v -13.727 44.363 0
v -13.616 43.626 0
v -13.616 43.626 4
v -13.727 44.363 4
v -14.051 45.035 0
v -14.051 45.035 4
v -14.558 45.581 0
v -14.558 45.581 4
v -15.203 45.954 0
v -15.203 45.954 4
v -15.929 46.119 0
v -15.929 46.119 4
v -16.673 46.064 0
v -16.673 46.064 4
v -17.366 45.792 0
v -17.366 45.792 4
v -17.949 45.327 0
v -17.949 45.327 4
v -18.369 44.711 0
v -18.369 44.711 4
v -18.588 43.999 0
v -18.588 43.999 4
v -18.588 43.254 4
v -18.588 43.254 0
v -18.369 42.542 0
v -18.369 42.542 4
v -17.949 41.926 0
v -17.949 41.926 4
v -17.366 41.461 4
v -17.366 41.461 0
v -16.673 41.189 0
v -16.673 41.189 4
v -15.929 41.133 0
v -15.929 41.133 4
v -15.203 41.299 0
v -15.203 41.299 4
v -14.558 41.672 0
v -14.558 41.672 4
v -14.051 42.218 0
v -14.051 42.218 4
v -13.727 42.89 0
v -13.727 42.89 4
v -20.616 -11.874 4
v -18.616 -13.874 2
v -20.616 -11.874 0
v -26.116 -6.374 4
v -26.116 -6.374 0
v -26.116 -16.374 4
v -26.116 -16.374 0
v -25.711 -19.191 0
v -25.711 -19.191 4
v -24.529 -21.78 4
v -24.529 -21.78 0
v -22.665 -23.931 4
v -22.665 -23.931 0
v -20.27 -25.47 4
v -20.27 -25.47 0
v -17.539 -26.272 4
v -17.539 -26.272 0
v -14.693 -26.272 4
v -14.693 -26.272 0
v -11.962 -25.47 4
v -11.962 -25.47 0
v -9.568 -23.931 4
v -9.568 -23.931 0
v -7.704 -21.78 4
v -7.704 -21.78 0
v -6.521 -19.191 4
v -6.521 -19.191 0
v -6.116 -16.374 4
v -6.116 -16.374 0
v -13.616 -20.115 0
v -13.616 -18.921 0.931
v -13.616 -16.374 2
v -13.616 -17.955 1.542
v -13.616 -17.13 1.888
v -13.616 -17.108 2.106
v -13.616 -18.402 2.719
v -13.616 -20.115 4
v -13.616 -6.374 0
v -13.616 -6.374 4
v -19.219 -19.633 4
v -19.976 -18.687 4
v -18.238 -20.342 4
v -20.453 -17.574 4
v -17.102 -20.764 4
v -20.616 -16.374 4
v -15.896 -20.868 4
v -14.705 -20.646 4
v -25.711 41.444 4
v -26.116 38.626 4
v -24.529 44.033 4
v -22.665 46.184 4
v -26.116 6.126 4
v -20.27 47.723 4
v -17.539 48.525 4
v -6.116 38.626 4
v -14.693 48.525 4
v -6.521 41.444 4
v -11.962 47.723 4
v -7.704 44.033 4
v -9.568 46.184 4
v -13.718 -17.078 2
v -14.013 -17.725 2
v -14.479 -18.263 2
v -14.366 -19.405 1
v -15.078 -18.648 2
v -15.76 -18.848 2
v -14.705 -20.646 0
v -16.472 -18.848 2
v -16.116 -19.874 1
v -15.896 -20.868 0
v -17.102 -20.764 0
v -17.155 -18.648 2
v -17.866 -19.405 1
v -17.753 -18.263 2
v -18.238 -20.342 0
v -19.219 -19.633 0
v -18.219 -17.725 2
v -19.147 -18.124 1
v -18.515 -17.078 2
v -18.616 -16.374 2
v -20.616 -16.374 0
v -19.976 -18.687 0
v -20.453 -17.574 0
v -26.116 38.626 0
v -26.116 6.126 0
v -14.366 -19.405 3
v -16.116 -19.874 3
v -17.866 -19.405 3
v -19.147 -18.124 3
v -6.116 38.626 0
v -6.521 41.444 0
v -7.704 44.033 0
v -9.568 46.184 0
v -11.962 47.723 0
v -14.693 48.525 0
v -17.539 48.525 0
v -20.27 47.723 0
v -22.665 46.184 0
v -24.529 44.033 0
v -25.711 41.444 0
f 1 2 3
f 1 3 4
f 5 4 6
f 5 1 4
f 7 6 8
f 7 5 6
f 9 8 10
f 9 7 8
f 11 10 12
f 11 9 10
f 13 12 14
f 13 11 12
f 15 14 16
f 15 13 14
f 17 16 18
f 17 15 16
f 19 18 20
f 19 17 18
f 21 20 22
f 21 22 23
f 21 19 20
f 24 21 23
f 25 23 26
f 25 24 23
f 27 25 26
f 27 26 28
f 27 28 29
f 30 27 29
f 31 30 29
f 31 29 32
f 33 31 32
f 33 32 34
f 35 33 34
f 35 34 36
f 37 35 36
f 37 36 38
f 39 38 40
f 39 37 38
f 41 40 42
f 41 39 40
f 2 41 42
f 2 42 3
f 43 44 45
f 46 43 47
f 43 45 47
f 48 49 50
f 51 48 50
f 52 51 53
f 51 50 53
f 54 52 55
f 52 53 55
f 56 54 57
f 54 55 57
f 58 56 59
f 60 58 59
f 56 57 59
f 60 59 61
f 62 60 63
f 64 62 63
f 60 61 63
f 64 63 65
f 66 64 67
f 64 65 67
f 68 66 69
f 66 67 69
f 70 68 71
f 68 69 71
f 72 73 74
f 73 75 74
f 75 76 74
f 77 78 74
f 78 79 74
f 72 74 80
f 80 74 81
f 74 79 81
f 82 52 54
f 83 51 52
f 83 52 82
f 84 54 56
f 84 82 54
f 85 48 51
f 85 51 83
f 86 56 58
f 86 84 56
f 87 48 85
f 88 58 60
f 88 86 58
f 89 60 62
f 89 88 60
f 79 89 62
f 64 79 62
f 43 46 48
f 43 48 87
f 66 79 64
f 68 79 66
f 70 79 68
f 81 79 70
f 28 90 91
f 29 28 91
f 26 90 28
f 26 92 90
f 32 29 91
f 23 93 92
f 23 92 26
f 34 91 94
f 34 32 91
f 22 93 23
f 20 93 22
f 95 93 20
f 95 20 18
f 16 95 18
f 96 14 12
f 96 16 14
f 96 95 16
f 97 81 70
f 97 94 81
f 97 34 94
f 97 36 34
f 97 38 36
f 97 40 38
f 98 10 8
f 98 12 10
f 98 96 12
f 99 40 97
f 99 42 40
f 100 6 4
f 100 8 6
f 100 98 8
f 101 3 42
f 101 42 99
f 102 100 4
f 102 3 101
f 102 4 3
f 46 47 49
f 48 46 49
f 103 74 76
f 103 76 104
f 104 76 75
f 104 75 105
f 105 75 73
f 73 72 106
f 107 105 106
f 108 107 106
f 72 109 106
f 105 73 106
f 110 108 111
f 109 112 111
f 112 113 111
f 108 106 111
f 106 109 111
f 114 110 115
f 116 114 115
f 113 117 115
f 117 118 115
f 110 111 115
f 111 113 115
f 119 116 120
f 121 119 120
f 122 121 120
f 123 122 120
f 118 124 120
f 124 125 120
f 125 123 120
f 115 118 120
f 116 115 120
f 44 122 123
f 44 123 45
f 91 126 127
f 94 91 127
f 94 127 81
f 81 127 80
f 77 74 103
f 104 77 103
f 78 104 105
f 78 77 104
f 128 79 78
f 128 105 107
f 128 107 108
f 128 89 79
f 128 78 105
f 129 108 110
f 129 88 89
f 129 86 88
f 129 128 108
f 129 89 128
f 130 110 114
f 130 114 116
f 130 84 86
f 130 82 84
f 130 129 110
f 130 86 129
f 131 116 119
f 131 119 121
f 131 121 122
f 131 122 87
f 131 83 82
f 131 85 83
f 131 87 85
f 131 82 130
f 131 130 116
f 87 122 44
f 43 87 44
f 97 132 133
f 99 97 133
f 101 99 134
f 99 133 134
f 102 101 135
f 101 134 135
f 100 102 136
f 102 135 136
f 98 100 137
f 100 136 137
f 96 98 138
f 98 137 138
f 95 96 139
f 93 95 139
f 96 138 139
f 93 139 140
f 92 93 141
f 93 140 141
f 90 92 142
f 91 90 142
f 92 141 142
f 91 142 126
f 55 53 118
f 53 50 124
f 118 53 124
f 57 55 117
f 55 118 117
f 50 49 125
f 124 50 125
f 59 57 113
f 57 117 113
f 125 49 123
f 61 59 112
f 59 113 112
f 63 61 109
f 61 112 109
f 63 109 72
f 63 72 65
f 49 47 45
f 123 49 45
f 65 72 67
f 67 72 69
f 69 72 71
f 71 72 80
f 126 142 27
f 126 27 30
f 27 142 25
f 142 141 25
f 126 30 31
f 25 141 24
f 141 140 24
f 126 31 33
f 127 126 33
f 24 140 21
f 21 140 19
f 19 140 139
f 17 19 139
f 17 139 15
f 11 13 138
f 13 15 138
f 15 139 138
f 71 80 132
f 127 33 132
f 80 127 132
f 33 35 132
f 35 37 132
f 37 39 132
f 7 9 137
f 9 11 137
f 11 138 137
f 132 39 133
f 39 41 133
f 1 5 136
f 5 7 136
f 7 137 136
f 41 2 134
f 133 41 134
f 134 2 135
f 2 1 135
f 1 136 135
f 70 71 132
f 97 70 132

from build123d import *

# Parameters (mm, degrees)
F0_R     = 2.5
F1_DEPTH = 4
F2_SIZE  = 1.99999
F3_W     = 3.2302876376
F3_H     = 15.0867640845
F4_DEPTH = 4


# Not quite as in the source:
# - a fillet or chamfer is up to 0.001 mm smaller than in the source, because OpenCascade refuses the exact size


with BuildPart() as f1:
    # F0 (on Top) → F1 (new body)
    with BuildSketch(Plane.XY):
        with BuildLine():
            ThreePointArc((-6.116279643, 38.6264544598), (-16.116279643, 28.6264544598), (-26.116279643, 38.6264544598))
            Line((-26.116279643, 38.6264544598), (-26.116279643, 6.1264544598))
            Line((-26.116279643, 6.1264544598), (-16.116279643, -3.8735455402))
            Line((-16.116279643, -3.8735455402), (-13.616279643, -6.3735455402))
            Line((-13.616279643, -6.3735455402), (-13.616279643, -12.0434185212))
            Line((-13.616279643, -12.0434185212), (-13.616279643, -16.3735455402))
            Line((-13.616279643, -16.3735455402), (-13.616279643, -20.7036725591))
            ThreePointArc((-13.616279643, -20.7036725591), (-18.616279643, -20.7036725591), (-21.116279643, -16.3735455402))
            Line((-21.116279643, -16.3735455402), (-21.116279643, -11.3735455402))
            Line((-21.116279643, -11.3735455402), (-26.116279643, -6.3735455402))
            Line((-26.116279643, -6.3735455402), (-26.116279643, -16.3735455402))
            ThreePointArc((-26.116279643, -16.3735455402), (-16.116279643, -26.3735455402), (-6.116279643, -16.3735455402))
            Line((-6.116279643, -16.3735455402), (-6.116279643, 38.6264544598))
        make_face()
        with BuildLine():
            ThreePointArc((-6.116279643, 38.6264544598), (-16.116279643, 48.6264544598), (-26.116279643, 38.6264544598))
            ThreePointArc((-26.116279643, 38.6264544598), (-16.116279643, 28.6264544598), (-6.116279643, 38.6264544598))
        make_face()
        with Locations((-16.116279643, 43.6264544598)):
            Circle(F0_R, mode=Mode.SUBTRACT)
        with BuildLine():
            Line((-13.616279643, -20.7036725591), (-13.616279643, -16.3735455402))
            ThreePointArc((-13.616279643, -16.3735455402), (-16.116279643, -18.8735455402), (-18.616279643, -16.3735455402))
            Line((-18.616279643, -16.3735455402), (-18.616279643, -13.8735455402))
            Line((-18.616279643, -13.8735455402), (-21.116279643, -11.3735455402))
            Line((-21.116279643, -11.3735455402), (-21.116279643, -16.3735455402))
            ThreePointArc((-21.116279643, -16.3735455402), (-18.616279643, -20.7036725591), (-13.616279643, -20.7036725591))
        make_face()
    extrude(amount=F1_DEPTH)

    # F2 (size 2 in the source; OpenCascade refuses exactly that, so slightly less here)
    f2_edges = [f1.edges().sort_by_distance(p)[0] for p in [
        (-16.11628, -18.873546, 4),
        (-18.61628, -15.123546, 4),
        (-16.11628, -18.873546, 0),
    ]]
    chamfer(f2_edges, length=F2_SIZE)

    # F3 (on face) → F4 (join)
    with BuildSketch(Plane.XY.offset(4)):
        with Locations((-12.0011358242, -13.9169275824)):
            Rectangle(F3_W, F3_H)
    extrude(amount=-F4_DEPTH)


solid = f1.part
